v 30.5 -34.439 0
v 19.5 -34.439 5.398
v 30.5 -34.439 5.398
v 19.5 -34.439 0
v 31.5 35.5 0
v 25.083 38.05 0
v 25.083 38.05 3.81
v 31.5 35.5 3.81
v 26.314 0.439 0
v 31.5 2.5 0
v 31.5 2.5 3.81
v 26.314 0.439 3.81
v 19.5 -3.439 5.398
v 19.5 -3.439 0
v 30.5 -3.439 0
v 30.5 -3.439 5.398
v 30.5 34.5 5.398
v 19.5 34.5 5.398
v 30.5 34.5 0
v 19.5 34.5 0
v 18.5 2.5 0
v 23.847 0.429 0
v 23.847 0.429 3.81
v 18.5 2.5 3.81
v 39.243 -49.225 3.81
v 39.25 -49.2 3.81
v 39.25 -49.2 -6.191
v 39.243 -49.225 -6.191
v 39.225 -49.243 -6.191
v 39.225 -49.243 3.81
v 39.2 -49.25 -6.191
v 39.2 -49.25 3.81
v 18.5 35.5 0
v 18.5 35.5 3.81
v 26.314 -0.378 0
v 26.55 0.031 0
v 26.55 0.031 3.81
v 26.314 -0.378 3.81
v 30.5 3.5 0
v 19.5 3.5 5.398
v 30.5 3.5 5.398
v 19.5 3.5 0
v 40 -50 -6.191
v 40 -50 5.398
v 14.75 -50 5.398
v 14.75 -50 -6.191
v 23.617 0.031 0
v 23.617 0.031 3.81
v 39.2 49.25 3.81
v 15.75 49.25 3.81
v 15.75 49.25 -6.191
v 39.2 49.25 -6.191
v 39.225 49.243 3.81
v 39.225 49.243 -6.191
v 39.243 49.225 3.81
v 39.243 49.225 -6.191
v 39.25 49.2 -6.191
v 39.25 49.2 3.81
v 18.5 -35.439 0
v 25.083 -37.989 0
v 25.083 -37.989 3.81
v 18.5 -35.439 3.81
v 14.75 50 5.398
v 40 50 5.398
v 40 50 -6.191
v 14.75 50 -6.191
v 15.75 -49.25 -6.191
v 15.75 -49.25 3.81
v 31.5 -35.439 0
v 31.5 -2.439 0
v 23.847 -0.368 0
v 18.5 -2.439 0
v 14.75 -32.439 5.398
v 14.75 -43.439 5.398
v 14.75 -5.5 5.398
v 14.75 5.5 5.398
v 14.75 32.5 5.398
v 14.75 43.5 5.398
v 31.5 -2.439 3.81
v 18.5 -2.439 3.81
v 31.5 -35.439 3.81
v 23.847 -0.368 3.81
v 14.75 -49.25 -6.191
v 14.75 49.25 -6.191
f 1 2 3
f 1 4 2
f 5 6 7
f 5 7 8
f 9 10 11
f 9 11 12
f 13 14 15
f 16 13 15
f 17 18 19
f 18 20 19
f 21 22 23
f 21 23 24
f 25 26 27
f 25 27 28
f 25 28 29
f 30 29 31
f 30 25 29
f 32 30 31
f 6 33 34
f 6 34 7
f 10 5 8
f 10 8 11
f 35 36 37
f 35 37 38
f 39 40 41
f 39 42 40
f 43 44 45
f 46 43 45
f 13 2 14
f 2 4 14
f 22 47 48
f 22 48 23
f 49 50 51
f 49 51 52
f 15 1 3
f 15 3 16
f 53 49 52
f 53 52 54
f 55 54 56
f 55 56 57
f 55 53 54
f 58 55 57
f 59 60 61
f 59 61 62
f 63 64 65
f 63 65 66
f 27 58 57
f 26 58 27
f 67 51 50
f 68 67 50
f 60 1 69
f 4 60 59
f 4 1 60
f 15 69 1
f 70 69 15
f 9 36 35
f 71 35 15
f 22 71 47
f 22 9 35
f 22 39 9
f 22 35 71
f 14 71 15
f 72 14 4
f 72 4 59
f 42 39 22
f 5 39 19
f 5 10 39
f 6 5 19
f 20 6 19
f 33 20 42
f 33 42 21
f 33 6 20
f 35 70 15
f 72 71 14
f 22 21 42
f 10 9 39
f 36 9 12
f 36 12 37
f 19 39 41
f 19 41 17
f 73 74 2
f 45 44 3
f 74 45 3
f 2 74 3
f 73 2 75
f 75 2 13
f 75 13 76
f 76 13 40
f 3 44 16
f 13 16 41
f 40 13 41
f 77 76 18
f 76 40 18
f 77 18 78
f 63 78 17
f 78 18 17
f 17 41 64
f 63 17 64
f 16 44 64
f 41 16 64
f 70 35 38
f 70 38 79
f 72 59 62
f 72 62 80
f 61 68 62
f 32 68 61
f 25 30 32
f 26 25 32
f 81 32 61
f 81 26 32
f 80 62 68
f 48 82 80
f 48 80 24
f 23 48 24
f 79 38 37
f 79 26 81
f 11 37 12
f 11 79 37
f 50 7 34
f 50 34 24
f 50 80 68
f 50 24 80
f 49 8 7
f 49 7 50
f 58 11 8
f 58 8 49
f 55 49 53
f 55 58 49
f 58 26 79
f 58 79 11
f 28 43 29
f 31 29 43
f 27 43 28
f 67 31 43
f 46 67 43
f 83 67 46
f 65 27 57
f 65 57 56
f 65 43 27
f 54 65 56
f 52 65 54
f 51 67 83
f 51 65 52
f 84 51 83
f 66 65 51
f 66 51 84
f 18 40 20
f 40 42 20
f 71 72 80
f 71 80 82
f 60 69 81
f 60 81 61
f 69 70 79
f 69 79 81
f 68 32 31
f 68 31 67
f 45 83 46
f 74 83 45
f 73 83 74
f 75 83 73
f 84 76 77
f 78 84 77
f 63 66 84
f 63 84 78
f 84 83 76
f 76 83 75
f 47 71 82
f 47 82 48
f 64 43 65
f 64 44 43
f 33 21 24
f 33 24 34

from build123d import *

# Parameters (mm, degrees)
SKETCH1_W               = 11
SKETCH1_H               = 31
BOSS_EXTRUDE1_DEPTH     = 3.81
SKETCH1_W_2             = 31
SKETCH1_H_2             = 11
BOSS_EXTRUDE1_2_DEPTH   = 3.81
BOSS_EXTRUDE1_3_DEPTH   = 3.81
BOSS_EXTRUDE1_4_DEPTH   = 3.81
BOSS_EXTRUDE1_5_DEPTH   = 3.81
SKETCH1_W_3             = 80
SKETCH1_H_3             = 100
SKETCH1_W_4             = 78.5
SKETCH1_H_4             = 98.5
BOSS_EXTRUDE1_6_DEPTH   = 3.81
SKETCH3_W               = 80
SKETCH3_H               = 100
SKETCH3_W_2             = 31
SKETCH3_H_2             = 11
SKETCH3_W_3             = 11
SKETCH3_H_3             = 31
BOSS_EXTRUDE2_DEPTH     = 1.5875
FILLET1_R               = 0.05
SKETCH4_W               = 80
SKETCH4_H               = 100
BOSS_EXTRUDE3_DEPTH     = 6.191
CUT_EXTRUDE1_DEPTH      = 65.807561295
CUT_EXTRUDE1_DEPTH_BACK = 65.807561295
SKETCH5_W               = 56.628696971
SKETCH5_H               = 106.323278981
CUT_EXTRUDE2_DEPTH      = 3.81
SKETCH7_W               = 1.5875
SKETCH7_H               = 11
BOSS_EXTRUDE4_DEPTH     = 0.75
SKETCH8_W               = 11.5885
SKETCH8_H               = 100
BOSS_EXTRUDE5_DEPTH     = 1


with BuildPart() as part:
    # Sketch1 → Boss-Extrude1 (new body)
    with BuildSketch(Plane.XY):
        Polygon((-26.313903431, 0.439060111), (-31.5, 2.5), (-31.5, 35.5), (-25.083245041, 38.05), (-18.5, 35.5), (-18.5, 2.5), (-23.846750882, 0.428952262), (-23.616775358, 0.03062297), (-23.846750882, -0.367706323), (-18.5, -2.438754061), (-18.5, -35.438754061), (-25.083245041, -37.988754061), (-31.5, -35.438754061), (-31.5, -2.438754061), (-26.313903431, -0.377814172), (-26.549714725, 0.03062297), align=None)
        with Locations((-25, -18.938754061)):
            Rectangle(SKETCH1_W, SKETCH1_H, mode=Mode.SUBTRACT)
        with Locations((-25, 19)):
            Rectangle(SKETCH1_W, SKETCH1_H, mode=Mode.SUBTRACT)
    extrude(amount=BOSS_EXTRUDE1_DEPTH)



with BuildPart() as body_2:
    # Sketch1 → Boss-Extrude1 2 (new body)
    with BuildSketch(Plane.XY):
        Polygon((-19.05, 0.03062297), (-16.5, 6.5), (16.5, 6.5), (19.05, 0.03062297), (16.5, -6.438754061), (-16.5, -6.438754061), align=None)
        Rectangle(SKETCH1_W_2, SKETCH1_H_2, mode=Mode.SUBTRACT)
    extrude(amount=BOSS_EXTRUDE1_2_DEPTH)


with BuildPart() as body_3:
    # Sketch1 → Boss-Extrude1 3 (new body)
    with BuildSketch(Plane.XY):
        Polygon((26.313903431, 0.439060111), (26.549714725, 0.03062297), (26.313903431, -0.377814172), (31.5, -2.438754061), (31.5, -35.438754061), (25.083245041, -37.988754061), (18.5, -35.438754061), (18.5, -2.438754061), (23.846750882, -0.367706323), (23.616775358, 0.03062297), (23.846750882, 0.428952262), (18.5, 2.5), (18.5, 35.5), (25.083245041, 38.05), (31.5, 35.5), (31.5, 2.5), align=None)
        with Locations((25, 19)):
            Rectangle(SKETCH1_W, SKETCH1_H, mode=Mode.SUBTRACT)
        with Locations((25, -18.938754061)):
            Rectangle(SKETCH1_W, SKETCH1_H, mode=Mode.SUBTRACT)
    extrude(amount=BOSS_EXTRUDE1_3_DEPTH)


with BuildPart() as body_4:
    # Sketch1 → Boss-Extrude1 4 (new body)
    with BuildSketch(Plane.XY):
        Polygon((-16.5, 31.52602227), (-19.05, 38.013011135), (-16.5, 44.5), (16.5, 44.5), (19.05, 38.013011135), (16.5, 31.52602227), align=None)
        with Locations((0, 38)):
            Rectangle(SKETCH1_W_2, SKETCH1_H_2, mode=Mode.SUBTRACT)
    extrude(amount=BOSS_EXTRUDE1_4_DEPTH)


with BuildPart() as body_5:
    # Sketch1 → Boss-Extrude1 5 (new body)
    with BuildSketch(Plane.XY):
        Polygon((16.5, -31.464776331), (19.05, -37.951765196), (16.5, -44.438754061), (-16.5, -44.438754061), (-19.05, -37.951765196), (-16.5, -31.464776331), align=None)
        with Locations((0, -37.938754061)):
            Rectangle(SKETCH1_W_2, SKETCH1_H_2, mode=Mode.SUBTRACT)
    extrude(amount=BOSS_EXTRUDE1_5_DEPTH)


with BuildPart() as body_6:
    # Sketch1 → Boss-Extrude1 6 (new body)
    with BuildSketch(Plane.XY):
        Rectangle(SKETCH1_W_3, SKETCH1_H_3)
        Rectangle(SKETCH1_W_4, SKETCH1_H_4, mode=Mode.SUBTRACT)
    extrude(amount=BOSS_EXTRUDE1_6_DEPTH)


with BuildPart() as part_1:
    add(part.part)

    add(body_2.part)  # Boss-Extrude2 merges body 2

    add(body_3.part)  # Boss-Extrude2 merges body 3

    add(body_4.part)  # Boss-Extrude2 merges body 4

    add(body_5.part)  # Boss-Extrude2 merges body 5

    add(body_6.part)  # Boss-Extrude2 merges body 6
    # Sketch3 → Boss-Extrude2 (add)
    with BuildSketch(Plane.XY.offset(3.81)):
        Rectangle(SKETCH3_W, SKETCH3_H)
        with Locations((0, -37.938754061)):
            Rectangle(SKETCH3_W_2, SKETCH3_H_2, mode=Mode.SUBTRACT)
        Rectangle(SKETCH3_W_2, SKETCH3_H_2, mode=Mode.SUBTRACT)
        with Locations((-25, -18.938754061)):
            Rectangle(SKETCH3_W_3, SKETCH3_H_3, mode=Mode.SUBTRACT)
        with Locations((-25, 19)):
            Rectangle(SKETCH3_W_3, SKETCH3_H_3, mode=Mode.SUBTRACT)
        with Locations((0, 38)):
            Rectangle(SKETCH3_W_2, SKETCH3_H_2, mode=Mode.SUBTRACT)
        with Locations((25, 19)):
            Rectangle(SKETCH3_W_3, SKETCH3_H_3, mode=Mode.SUBTRACT)
        with Locations((25, -18.938754061)):
            Rectangle(SKETCH3_W_3, SKETCH3_H_3, mode=Mode.SUBTRACT)
    extrude(amount=BOSS_EXTRUDE2_DEPTH)

    # Fillet1
    fillet1_edges = [part_1.edges().sort_by_distance(p)[0] for p in [
        (39.25, 49.25, 1.905),
        (39.25, -49.25, 1.905),
        (-39.25, -49.25, 1.905),
        (-39.25, 49.25, 1.905),
    ]]
    fillet(fillet1_edges, radius=FILLET1_R)

    # Sketch4 → Boss-Extrude3 (add)
    with BuildSketch(Plane(origin=(0, 0, 0), x_dir=(-1, 0, 0), z_dir=(0, 0, -1))):
        Rectangle(SKETCH4_W, SKETCH4_H)
        with BuildLine():
            Line((-39.2, -49.25), (39.2, -49.25))
            ThreePointArc((39.2, -49.25), (39.235355339, -49.235355339), (39.25, -49.2))
            Line((39.25, -49.2), (39.25, 49.2))
            ThreePointArc((39.25, 49.2), (39.235355339, 49.235355339), (39.2, 49.25))
            Line((39.2, 49.25), (-39.2, 49.25))
            ThreePointArc((-39.2, 49.25), (-39.235355339, 49.235355339), (-39.25, 49.2))
            Line((-39.25, 49.2), (-39.25, -49.2))
            ThreePointArc((-39.25, -49.2), (-39.235355339, -49.235355339), (-39.2, -49.25))
        make_face(mode=Mode.SUBTRACT)
    extrude(amount=BOSS_EXTRUDE3_DEPTH)

    # Sketch5 → Cut-Extrude1 (cut, two sides: drawn at the far end of the back side and taken through both)
    with BuildSketch(Plane(origin=(0, 0, 3.81), x_dir=(-1, 0, 0), z_dir=(0, 0, -1)).offset(-CUT_EXTRUDE1_DEPTH_BACK)):
        with Locations((13.564348486, -0.302353259)):
            Rectangle(SKETCH5_W, SKETCH5_H)
    extrude(amount=CUT_EXTRUDE1_DEPTH + CUT_EXTRUDE1_DEPTH_BACK, mode=Mode.SUBTRACT)

    # Sketch6 → Cut-Extrude2 (cut)
    with BuildSketch(Plane(origin=(0, 0, 0), x_dir=(-1, 0, 0), z_dir=(0, 0, -1))):
        Polygon((-16.5, -44.438754061), (-14.75, -44.438754061), (-14.75, -43.438754061), (-15.5, -43.438754061), (-15.5, -32.438754061), (-14.75, -32.438754061), (-14.75, -31.464776331), (-16.5, -31.464776331), (-19.05, -37.951765196), align=None)
        Polygon((-16.5, -6.438754061), (-14.75, -6.438754061), (-14.75, -5.5), (-15.5, -5.5), (-15.5, 5.5), (-14.75, 5.5), (-14.75, 6.5), (-16.5, 6.5), (-19.05, 0.03062297), align=None)
        Polygon((-16.5, 31.52602227), (-14.75, 31.52602227), (-14.75, 32.5), (-15.5, 32.5), (-15.5, 43.5), (-14.75, 43.5), (-14.75, 44.5), (-16.5, 44.5), (-19.05, 38.013011135), align=None)
    extrude(amount=-CUT_EXTRUDE2_DEPTH, mode=Mode.SUBTRACT)

    # Sketch7 → Boss-Extrude4 (add)
    with BuildSketch(Plane.ZY.offset(-15.5)):
        with Locations((4.60375, 38)):
            Rectangle(SKETCH7_W, SKETCH7_H)
        with Locations((4.60375, 0)):
            Rectangle(SKETCH7_W, SKETCH7_H)
        with Locations((4.60375, -37.938754061)):
            Rectangle(SKETCH7_W, SKETCH7_H)
    extrude(amount=BOSS_EXTRUDE4_DEPTH)

    # Sketch8 → Boss-Extrude5 (add)
    with BuildSketch(Plane.ZY.offset(-14.75)):
        with Locations((-0.39675, 0)):
            Rectangle(SKETCH8_W, SKETCH8_H)
    extrude(amount=-BOSS_EXTRUDE5_DEPTH)


solid = part_1.part
